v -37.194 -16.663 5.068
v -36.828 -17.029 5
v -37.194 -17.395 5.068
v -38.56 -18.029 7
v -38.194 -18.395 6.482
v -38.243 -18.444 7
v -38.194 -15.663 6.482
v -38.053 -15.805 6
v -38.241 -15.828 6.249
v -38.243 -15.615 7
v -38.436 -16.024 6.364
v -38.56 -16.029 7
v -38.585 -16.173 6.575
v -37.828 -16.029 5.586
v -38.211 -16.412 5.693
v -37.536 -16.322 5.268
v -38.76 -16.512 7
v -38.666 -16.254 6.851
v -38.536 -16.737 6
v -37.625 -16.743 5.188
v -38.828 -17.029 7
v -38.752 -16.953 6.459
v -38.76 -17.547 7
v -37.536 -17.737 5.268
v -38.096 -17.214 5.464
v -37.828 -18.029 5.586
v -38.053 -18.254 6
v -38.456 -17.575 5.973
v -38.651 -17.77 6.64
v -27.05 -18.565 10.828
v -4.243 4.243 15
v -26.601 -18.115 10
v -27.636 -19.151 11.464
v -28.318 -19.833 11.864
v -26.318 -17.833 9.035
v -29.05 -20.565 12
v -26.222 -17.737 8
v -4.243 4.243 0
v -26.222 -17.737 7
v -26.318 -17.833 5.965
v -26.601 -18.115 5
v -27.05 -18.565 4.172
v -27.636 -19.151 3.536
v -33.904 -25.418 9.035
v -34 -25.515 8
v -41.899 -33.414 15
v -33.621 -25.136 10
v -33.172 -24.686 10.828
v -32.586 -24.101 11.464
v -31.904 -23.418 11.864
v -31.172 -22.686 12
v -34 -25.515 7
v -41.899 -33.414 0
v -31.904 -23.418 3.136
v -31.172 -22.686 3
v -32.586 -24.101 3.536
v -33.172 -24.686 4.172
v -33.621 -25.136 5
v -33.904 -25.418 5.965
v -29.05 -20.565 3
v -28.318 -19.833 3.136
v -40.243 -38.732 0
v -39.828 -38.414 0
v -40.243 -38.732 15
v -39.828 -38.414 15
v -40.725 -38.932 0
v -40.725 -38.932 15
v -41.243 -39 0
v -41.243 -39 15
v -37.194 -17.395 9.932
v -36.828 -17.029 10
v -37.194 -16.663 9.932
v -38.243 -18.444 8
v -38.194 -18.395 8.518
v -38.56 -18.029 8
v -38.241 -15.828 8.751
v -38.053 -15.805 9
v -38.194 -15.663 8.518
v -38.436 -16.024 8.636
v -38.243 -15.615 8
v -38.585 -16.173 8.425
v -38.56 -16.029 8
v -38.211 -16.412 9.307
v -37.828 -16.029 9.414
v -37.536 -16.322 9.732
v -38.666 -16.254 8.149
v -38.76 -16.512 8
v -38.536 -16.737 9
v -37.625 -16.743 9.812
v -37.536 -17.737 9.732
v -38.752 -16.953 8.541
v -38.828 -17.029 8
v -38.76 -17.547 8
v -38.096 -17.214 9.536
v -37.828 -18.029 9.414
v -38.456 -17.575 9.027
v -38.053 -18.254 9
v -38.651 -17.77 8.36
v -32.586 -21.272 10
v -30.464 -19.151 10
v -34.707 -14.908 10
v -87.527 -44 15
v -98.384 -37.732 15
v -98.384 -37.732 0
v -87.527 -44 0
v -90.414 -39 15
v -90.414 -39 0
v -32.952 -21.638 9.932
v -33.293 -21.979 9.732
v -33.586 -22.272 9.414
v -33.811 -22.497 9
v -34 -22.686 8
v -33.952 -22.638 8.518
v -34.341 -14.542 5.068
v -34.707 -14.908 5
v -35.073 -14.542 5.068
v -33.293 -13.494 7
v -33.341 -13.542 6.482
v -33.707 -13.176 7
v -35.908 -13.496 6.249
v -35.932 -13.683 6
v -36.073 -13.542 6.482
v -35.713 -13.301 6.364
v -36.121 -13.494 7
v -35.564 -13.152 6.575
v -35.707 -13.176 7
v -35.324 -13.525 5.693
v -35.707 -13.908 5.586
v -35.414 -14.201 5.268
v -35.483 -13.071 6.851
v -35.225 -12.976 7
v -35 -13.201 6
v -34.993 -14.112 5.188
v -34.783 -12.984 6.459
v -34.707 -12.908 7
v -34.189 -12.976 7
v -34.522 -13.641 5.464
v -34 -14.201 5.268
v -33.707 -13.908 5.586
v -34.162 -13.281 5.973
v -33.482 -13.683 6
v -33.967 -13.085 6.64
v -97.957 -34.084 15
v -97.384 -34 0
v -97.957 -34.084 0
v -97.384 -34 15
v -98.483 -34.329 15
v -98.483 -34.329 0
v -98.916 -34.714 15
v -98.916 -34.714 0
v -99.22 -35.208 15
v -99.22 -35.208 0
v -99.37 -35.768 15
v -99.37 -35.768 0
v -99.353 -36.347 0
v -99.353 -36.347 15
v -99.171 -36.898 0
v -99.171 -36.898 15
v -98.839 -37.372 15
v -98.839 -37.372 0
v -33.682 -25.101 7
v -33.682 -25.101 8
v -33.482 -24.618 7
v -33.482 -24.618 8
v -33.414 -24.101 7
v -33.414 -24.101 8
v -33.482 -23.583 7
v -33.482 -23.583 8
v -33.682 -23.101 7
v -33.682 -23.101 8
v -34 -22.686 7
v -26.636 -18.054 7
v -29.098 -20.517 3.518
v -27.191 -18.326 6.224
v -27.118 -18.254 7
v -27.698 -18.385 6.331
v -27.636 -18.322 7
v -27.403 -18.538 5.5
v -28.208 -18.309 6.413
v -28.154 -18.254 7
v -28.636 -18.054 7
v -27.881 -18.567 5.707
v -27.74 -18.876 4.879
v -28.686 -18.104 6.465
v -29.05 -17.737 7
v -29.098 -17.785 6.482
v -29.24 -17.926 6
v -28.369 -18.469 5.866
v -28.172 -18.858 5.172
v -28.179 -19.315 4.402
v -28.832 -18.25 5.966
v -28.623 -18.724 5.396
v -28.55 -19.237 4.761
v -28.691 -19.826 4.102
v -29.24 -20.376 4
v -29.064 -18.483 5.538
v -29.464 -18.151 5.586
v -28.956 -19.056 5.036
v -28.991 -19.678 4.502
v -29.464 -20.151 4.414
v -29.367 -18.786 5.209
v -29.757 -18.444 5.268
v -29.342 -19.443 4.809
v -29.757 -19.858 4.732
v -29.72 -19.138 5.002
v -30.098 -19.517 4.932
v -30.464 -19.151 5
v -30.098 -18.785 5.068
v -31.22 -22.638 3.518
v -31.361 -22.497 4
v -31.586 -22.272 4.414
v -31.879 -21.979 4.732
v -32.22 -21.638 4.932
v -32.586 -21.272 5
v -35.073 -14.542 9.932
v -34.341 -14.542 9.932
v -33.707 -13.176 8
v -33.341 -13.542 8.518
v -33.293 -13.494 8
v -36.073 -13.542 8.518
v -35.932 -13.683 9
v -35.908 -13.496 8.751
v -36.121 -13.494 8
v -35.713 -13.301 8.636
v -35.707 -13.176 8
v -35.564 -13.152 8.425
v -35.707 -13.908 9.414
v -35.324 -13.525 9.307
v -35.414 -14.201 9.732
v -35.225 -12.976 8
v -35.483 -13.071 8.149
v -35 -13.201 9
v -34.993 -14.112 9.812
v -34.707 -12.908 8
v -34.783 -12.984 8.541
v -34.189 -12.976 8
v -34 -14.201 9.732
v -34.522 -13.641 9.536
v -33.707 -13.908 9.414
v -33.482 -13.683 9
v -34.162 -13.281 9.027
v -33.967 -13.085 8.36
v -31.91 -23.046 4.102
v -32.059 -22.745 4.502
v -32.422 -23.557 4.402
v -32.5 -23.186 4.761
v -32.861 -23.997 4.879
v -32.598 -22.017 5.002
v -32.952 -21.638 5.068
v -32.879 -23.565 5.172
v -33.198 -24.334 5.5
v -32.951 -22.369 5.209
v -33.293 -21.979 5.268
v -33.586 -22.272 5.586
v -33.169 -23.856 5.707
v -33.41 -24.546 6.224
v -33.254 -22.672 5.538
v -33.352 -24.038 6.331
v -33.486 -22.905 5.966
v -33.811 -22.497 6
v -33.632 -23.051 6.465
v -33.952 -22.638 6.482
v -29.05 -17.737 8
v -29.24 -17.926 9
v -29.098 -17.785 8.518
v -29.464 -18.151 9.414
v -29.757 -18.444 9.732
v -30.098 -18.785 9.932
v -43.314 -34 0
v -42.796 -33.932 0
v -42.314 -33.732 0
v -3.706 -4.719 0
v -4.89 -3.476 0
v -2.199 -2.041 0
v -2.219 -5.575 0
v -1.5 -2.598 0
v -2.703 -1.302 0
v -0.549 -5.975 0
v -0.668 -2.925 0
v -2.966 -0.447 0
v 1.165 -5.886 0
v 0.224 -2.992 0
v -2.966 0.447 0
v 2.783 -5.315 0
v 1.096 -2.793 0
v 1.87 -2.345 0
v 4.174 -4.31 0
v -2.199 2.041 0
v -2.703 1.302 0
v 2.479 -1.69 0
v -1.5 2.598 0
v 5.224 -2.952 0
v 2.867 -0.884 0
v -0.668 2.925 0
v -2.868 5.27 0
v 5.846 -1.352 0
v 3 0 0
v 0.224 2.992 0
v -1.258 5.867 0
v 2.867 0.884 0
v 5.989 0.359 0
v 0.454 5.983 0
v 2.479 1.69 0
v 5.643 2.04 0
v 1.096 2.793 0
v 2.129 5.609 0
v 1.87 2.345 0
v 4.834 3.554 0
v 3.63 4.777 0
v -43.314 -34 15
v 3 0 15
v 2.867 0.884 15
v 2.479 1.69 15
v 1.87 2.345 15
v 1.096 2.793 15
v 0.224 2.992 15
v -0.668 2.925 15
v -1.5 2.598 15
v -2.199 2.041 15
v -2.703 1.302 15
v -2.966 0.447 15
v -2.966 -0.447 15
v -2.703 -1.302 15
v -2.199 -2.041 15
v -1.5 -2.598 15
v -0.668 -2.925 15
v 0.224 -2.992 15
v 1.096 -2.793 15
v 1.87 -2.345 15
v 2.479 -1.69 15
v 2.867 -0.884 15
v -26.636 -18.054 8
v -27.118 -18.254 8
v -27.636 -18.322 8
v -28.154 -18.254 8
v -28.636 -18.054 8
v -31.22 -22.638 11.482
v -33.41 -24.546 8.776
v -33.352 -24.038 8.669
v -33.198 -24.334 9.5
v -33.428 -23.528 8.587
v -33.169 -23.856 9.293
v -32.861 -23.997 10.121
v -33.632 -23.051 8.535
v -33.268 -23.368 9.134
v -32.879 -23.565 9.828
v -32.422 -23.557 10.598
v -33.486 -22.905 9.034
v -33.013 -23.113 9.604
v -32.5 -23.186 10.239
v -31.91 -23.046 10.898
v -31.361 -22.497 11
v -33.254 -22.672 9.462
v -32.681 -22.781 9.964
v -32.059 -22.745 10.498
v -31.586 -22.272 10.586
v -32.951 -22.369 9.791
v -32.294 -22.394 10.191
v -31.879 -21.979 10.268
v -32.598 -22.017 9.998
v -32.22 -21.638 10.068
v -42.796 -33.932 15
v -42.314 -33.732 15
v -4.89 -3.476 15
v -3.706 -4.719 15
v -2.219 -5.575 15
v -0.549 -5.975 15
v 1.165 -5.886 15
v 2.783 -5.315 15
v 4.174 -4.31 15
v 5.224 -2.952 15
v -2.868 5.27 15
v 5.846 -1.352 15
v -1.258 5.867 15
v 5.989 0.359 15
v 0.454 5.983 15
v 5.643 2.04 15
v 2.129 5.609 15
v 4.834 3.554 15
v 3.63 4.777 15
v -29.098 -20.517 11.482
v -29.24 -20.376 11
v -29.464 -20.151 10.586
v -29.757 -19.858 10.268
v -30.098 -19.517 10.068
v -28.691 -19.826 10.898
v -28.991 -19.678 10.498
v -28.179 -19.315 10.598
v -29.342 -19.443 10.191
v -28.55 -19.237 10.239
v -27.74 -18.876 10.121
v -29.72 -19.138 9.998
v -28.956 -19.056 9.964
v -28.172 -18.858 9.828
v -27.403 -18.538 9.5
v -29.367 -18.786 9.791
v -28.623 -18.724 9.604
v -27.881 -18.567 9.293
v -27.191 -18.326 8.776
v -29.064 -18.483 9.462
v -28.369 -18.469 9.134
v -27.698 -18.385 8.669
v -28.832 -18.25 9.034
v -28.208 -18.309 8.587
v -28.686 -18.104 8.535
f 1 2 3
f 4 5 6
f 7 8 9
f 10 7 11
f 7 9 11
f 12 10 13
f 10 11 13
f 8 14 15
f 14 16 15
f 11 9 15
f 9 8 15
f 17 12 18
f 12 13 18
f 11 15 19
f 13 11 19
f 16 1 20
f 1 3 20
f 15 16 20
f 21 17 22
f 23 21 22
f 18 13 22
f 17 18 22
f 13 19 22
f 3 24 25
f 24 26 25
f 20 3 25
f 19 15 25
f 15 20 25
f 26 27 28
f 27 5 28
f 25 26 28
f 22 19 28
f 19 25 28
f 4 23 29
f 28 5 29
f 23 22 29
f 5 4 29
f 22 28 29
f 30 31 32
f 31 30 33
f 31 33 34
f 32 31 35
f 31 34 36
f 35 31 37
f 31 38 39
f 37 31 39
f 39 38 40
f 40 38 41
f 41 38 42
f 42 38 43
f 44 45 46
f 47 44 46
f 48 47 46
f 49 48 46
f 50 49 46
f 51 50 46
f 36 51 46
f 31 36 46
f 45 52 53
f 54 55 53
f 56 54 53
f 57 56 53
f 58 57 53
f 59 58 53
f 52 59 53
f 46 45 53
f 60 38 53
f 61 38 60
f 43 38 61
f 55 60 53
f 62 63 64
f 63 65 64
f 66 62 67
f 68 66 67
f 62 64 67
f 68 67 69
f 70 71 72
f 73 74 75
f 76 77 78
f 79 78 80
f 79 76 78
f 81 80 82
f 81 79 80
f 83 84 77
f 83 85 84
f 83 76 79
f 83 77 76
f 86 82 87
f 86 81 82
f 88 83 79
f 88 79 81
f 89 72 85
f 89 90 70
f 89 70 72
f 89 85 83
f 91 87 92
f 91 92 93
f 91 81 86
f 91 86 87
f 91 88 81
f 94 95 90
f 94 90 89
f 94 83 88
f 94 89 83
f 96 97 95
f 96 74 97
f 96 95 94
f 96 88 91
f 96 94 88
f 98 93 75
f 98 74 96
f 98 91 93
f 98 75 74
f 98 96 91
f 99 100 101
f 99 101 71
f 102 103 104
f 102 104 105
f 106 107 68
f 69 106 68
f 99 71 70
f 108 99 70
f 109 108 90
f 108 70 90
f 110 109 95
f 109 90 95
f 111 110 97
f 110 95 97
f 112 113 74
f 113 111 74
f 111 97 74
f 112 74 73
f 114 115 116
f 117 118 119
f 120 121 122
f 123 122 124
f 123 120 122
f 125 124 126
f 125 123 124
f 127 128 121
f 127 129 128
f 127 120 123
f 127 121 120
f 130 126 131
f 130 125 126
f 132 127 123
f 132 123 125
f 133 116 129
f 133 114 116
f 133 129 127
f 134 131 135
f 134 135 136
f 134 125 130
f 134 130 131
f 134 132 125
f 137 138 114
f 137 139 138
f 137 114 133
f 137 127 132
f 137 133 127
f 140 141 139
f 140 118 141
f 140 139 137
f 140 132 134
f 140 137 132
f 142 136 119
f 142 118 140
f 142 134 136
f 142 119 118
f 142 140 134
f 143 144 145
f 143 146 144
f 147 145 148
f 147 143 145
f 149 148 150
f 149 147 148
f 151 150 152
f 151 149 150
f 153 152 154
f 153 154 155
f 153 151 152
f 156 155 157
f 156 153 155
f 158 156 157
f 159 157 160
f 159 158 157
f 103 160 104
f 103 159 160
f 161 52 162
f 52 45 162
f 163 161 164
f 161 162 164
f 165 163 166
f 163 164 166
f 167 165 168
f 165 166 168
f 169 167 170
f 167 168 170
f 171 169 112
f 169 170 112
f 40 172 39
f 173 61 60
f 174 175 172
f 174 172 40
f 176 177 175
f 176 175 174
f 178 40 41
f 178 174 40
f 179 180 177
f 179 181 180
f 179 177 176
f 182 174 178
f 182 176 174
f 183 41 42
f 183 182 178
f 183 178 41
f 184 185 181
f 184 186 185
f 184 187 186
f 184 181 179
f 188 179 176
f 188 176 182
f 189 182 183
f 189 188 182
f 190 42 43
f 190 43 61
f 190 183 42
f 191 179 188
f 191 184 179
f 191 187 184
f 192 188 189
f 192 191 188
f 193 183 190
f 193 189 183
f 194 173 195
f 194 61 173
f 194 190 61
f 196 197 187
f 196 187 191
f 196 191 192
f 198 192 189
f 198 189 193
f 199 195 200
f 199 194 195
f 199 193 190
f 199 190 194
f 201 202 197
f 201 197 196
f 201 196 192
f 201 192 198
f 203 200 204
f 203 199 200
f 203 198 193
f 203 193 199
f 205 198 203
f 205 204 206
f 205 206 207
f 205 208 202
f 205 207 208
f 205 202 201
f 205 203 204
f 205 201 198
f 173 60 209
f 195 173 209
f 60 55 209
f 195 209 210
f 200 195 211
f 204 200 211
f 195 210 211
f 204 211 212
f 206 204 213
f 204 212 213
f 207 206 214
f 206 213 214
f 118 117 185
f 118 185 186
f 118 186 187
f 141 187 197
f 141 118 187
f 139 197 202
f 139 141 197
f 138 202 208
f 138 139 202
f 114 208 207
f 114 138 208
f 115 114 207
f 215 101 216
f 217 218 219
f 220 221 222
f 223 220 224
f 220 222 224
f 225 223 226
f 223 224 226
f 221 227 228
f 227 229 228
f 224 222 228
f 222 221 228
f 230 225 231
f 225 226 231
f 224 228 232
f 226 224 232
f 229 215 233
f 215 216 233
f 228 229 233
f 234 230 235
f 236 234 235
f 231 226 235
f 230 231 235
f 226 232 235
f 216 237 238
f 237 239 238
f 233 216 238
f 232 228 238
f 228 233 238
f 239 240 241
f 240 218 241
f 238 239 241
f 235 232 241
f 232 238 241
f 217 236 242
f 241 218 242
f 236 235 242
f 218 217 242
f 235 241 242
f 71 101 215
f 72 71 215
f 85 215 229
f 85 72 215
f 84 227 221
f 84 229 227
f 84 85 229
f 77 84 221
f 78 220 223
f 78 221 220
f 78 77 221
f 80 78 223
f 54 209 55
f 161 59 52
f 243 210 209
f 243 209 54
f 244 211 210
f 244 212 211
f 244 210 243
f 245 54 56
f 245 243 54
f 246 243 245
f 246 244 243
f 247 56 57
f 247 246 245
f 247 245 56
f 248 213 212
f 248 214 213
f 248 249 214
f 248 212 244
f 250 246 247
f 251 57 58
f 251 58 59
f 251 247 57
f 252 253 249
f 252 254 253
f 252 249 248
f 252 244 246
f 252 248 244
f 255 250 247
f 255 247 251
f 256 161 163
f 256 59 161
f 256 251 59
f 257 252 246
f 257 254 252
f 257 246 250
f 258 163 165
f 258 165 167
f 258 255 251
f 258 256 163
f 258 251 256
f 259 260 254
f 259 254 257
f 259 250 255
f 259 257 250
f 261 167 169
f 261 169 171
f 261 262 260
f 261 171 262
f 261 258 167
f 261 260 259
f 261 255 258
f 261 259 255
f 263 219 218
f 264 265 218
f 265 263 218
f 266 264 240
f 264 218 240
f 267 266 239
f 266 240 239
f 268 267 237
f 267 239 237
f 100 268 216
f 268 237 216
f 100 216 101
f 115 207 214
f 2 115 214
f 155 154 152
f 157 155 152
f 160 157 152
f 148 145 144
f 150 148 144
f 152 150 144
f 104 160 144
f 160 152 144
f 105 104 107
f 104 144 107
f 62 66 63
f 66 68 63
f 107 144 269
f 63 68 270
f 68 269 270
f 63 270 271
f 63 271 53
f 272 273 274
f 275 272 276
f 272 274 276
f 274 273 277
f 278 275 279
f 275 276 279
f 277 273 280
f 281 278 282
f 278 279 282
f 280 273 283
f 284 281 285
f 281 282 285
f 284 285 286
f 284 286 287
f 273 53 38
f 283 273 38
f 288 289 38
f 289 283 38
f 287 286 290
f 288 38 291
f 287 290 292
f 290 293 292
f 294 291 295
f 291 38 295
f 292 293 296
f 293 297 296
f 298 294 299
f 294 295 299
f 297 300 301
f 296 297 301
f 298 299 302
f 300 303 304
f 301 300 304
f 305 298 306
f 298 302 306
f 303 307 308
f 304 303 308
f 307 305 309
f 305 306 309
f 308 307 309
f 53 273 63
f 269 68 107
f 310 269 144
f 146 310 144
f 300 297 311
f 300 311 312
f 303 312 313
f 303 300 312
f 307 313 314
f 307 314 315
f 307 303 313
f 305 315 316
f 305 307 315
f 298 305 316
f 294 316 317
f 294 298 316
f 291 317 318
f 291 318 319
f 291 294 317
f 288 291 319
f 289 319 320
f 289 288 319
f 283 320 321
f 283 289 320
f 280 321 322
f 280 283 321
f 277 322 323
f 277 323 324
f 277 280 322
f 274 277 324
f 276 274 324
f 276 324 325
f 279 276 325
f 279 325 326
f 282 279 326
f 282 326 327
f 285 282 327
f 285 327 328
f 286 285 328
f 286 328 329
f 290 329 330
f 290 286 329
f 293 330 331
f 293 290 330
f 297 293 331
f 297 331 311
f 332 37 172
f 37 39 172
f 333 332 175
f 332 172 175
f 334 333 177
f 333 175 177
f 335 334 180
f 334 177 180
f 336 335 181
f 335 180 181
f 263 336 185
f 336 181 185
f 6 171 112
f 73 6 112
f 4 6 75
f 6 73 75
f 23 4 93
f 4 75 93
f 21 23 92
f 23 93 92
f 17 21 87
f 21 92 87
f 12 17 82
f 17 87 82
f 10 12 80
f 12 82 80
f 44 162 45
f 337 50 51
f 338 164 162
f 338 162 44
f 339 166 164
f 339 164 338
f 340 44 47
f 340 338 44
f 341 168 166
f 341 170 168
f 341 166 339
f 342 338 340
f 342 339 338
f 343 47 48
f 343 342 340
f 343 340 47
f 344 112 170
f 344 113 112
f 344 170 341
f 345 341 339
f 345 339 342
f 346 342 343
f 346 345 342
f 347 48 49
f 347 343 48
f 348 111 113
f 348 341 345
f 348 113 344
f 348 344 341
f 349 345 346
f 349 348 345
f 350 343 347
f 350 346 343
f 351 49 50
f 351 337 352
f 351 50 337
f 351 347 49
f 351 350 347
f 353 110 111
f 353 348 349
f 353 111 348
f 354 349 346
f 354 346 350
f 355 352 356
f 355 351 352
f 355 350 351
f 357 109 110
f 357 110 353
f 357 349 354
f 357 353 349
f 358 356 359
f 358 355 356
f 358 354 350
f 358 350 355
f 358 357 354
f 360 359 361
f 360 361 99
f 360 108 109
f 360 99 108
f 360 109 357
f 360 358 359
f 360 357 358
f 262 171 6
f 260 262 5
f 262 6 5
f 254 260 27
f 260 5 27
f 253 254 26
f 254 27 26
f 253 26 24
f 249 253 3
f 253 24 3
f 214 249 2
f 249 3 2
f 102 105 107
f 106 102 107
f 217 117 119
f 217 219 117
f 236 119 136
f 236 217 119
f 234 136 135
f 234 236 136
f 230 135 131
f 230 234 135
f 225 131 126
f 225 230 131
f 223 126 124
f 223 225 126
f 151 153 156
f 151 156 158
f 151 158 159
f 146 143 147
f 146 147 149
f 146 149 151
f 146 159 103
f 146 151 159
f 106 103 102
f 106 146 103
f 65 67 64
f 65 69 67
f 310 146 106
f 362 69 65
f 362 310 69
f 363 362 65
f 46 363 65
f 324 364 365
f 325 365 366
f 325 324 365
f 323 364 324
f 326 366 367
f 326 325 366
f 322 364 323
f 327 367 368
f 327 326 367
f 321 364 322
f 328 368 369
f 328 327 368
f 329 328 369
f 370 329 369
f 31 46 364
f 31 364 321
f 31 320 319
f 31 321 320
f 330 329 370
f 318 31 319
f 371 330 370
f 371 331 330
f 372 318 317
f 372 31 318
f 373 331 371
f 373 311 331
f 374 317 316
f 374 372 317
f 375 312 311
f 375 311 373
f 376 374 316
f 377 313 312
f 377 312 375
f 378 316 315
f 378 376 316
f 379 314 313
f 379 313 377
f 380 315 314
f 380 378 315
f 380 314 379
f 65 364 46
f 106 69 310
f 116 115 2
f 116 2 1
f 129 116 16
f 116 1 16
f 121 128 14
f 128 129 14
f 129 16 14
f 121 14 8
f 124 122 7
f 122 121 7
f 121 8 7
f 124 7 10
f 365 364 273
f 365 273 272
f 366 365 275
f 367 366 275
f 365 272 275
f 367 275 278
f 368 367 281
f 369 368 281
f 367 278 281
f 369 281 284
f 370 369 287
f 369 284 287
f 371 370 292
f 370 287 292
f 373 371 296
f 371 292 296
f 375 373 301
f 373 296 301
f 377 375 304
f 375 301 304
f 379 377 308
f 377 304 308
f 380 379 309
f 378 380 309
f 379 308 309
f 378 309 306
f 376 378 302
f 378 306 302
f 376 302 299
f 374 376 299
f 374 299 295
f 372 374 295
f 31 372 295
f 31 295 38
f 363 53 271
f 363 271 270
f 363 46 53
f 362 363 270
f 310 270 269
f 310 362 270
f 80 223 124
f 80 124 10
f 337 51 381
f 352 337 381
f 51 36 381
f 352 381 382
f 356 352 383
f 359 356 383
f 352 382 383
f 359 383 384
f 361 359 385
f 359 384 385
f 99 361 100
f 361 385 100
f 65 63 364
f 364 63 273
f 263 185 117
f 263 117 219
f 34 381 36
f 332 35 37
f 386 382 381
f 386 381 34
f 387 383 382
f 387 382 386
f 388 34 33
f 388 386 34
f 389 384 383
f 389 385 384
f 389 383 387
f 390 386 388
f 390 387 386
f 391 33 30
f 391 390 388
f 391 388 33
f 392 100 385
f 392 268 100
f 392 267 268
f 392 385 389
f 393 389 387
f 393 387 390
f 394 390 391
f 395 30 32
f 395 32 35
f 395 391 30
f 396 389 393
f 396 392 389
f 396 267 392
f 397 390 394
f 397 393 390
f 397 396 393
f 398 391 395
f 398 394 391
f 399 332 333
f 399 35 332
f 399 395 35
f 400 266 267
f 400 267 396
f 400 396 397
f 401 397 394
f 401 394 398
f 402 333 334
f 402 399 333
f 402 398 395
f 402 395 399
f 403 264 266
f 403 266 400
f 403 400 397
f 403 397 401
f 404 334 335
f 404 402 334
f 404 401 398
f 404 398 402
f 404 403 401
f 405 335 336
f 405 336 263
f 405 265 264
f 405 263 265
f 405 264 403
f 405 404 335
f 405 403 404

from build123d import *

# Parameters (mm, degrees)
F0_R     = 3
F1_DEPTH = 15
F2_W     = 7
F2_H     = 5
F3_DEPTH = 10
F4_F1_R  = 2
F4_F2_R  = 2
F5_R     = 2


with BuildPart() as f1:
    # F0 (on Top) → F1 (new body)
    with BuildSketch(Plane.XY):
        with BuildLine():
            Line((-40.4142135624, -39), (-4.8904069139, -3.4761933515))
            ThreePointArc((-4.8904069139, -3.4761933515), (5.9789831367, -0.5017575617), (-4.2426406871, 4.2426406871))
            Line((-4.2426406871, 4.2426406871), (-42.4852813742, -34))
            Line((-42.4852813742, -34), (-104.8479702921, -34))
            Line((-104.8479702921, -34), (-87.5274622164, -44))
            Line((-87.5274622164, -44), (-90.4142135624, -39))
            Line((-90.4142135624, -39), (-40.4142135624, -39))
        make_face()
        Circle(F0_R, mode=Mode.SUBTRACT)
    extrude(amount=F1_DEPTH)

    # F2 (on face) → F3 (join)
    with BuildSketch(Plane(origin=(-4.2426406871, 4.2426406871, 0), x_dir=(-0.7071067812, -0.7071067812, 0), z_dir=(-0.7071067812, 0.7071067812, 0))):
        with Locations((36.5832611207, 7.5)):
            Rectangle(F2_W, F2_H)
    extrude(amount=F3_DEPTH)

    # F4: fillet of radius 2 on 9 edges, made by hand

    # F4_f1
    f4_f1_edges = [f1.edges().sort_by_distance(p)[0] for p in [
        (-36.1213203436, -20.5649711575, 10),
        (-36.1213203436, -20.5649711575, 5),
        (-31.1715728753, -15.6152236891, 5),
        (-31.1715728753, -15.6152236891, 10),
        (-37.1819805153, -14.5545635174, 10),
        (-37.1819805153, -14.5545635174, 5),
        (-34.7071067812, -12.0796897832, 7.5),
        (-39.6568542495, -17.0294372515, 7.5),
    ]]
    fillet(f4_f1_edges, radius=F4_F1_R)

    # F4_f2
    f4_f2_edges = [f1.edges().sort_by_distance(p)[0] for p in [
        (-32.5857864376, -24.1005050634, 7.5),
        (-32.1715728753, -23.686291501, 5.5857864376),
        (-32.1715728753, -23.686291501, 9.4142135624),
    ]]
    fillet(f4_f2_edges, radius=F4_F2_R)

    # F5
    f5_edges = [f1.edges().sort_by_distance(p)[0] for p in [
        (-104.84797, -34, 7.5),
        (-40.414214, -39, 7.5),
        (-42.485281, -34, 7.5),
    ]]
    fillet(f5_edges, radius=F5_R)


solid = f1.part
